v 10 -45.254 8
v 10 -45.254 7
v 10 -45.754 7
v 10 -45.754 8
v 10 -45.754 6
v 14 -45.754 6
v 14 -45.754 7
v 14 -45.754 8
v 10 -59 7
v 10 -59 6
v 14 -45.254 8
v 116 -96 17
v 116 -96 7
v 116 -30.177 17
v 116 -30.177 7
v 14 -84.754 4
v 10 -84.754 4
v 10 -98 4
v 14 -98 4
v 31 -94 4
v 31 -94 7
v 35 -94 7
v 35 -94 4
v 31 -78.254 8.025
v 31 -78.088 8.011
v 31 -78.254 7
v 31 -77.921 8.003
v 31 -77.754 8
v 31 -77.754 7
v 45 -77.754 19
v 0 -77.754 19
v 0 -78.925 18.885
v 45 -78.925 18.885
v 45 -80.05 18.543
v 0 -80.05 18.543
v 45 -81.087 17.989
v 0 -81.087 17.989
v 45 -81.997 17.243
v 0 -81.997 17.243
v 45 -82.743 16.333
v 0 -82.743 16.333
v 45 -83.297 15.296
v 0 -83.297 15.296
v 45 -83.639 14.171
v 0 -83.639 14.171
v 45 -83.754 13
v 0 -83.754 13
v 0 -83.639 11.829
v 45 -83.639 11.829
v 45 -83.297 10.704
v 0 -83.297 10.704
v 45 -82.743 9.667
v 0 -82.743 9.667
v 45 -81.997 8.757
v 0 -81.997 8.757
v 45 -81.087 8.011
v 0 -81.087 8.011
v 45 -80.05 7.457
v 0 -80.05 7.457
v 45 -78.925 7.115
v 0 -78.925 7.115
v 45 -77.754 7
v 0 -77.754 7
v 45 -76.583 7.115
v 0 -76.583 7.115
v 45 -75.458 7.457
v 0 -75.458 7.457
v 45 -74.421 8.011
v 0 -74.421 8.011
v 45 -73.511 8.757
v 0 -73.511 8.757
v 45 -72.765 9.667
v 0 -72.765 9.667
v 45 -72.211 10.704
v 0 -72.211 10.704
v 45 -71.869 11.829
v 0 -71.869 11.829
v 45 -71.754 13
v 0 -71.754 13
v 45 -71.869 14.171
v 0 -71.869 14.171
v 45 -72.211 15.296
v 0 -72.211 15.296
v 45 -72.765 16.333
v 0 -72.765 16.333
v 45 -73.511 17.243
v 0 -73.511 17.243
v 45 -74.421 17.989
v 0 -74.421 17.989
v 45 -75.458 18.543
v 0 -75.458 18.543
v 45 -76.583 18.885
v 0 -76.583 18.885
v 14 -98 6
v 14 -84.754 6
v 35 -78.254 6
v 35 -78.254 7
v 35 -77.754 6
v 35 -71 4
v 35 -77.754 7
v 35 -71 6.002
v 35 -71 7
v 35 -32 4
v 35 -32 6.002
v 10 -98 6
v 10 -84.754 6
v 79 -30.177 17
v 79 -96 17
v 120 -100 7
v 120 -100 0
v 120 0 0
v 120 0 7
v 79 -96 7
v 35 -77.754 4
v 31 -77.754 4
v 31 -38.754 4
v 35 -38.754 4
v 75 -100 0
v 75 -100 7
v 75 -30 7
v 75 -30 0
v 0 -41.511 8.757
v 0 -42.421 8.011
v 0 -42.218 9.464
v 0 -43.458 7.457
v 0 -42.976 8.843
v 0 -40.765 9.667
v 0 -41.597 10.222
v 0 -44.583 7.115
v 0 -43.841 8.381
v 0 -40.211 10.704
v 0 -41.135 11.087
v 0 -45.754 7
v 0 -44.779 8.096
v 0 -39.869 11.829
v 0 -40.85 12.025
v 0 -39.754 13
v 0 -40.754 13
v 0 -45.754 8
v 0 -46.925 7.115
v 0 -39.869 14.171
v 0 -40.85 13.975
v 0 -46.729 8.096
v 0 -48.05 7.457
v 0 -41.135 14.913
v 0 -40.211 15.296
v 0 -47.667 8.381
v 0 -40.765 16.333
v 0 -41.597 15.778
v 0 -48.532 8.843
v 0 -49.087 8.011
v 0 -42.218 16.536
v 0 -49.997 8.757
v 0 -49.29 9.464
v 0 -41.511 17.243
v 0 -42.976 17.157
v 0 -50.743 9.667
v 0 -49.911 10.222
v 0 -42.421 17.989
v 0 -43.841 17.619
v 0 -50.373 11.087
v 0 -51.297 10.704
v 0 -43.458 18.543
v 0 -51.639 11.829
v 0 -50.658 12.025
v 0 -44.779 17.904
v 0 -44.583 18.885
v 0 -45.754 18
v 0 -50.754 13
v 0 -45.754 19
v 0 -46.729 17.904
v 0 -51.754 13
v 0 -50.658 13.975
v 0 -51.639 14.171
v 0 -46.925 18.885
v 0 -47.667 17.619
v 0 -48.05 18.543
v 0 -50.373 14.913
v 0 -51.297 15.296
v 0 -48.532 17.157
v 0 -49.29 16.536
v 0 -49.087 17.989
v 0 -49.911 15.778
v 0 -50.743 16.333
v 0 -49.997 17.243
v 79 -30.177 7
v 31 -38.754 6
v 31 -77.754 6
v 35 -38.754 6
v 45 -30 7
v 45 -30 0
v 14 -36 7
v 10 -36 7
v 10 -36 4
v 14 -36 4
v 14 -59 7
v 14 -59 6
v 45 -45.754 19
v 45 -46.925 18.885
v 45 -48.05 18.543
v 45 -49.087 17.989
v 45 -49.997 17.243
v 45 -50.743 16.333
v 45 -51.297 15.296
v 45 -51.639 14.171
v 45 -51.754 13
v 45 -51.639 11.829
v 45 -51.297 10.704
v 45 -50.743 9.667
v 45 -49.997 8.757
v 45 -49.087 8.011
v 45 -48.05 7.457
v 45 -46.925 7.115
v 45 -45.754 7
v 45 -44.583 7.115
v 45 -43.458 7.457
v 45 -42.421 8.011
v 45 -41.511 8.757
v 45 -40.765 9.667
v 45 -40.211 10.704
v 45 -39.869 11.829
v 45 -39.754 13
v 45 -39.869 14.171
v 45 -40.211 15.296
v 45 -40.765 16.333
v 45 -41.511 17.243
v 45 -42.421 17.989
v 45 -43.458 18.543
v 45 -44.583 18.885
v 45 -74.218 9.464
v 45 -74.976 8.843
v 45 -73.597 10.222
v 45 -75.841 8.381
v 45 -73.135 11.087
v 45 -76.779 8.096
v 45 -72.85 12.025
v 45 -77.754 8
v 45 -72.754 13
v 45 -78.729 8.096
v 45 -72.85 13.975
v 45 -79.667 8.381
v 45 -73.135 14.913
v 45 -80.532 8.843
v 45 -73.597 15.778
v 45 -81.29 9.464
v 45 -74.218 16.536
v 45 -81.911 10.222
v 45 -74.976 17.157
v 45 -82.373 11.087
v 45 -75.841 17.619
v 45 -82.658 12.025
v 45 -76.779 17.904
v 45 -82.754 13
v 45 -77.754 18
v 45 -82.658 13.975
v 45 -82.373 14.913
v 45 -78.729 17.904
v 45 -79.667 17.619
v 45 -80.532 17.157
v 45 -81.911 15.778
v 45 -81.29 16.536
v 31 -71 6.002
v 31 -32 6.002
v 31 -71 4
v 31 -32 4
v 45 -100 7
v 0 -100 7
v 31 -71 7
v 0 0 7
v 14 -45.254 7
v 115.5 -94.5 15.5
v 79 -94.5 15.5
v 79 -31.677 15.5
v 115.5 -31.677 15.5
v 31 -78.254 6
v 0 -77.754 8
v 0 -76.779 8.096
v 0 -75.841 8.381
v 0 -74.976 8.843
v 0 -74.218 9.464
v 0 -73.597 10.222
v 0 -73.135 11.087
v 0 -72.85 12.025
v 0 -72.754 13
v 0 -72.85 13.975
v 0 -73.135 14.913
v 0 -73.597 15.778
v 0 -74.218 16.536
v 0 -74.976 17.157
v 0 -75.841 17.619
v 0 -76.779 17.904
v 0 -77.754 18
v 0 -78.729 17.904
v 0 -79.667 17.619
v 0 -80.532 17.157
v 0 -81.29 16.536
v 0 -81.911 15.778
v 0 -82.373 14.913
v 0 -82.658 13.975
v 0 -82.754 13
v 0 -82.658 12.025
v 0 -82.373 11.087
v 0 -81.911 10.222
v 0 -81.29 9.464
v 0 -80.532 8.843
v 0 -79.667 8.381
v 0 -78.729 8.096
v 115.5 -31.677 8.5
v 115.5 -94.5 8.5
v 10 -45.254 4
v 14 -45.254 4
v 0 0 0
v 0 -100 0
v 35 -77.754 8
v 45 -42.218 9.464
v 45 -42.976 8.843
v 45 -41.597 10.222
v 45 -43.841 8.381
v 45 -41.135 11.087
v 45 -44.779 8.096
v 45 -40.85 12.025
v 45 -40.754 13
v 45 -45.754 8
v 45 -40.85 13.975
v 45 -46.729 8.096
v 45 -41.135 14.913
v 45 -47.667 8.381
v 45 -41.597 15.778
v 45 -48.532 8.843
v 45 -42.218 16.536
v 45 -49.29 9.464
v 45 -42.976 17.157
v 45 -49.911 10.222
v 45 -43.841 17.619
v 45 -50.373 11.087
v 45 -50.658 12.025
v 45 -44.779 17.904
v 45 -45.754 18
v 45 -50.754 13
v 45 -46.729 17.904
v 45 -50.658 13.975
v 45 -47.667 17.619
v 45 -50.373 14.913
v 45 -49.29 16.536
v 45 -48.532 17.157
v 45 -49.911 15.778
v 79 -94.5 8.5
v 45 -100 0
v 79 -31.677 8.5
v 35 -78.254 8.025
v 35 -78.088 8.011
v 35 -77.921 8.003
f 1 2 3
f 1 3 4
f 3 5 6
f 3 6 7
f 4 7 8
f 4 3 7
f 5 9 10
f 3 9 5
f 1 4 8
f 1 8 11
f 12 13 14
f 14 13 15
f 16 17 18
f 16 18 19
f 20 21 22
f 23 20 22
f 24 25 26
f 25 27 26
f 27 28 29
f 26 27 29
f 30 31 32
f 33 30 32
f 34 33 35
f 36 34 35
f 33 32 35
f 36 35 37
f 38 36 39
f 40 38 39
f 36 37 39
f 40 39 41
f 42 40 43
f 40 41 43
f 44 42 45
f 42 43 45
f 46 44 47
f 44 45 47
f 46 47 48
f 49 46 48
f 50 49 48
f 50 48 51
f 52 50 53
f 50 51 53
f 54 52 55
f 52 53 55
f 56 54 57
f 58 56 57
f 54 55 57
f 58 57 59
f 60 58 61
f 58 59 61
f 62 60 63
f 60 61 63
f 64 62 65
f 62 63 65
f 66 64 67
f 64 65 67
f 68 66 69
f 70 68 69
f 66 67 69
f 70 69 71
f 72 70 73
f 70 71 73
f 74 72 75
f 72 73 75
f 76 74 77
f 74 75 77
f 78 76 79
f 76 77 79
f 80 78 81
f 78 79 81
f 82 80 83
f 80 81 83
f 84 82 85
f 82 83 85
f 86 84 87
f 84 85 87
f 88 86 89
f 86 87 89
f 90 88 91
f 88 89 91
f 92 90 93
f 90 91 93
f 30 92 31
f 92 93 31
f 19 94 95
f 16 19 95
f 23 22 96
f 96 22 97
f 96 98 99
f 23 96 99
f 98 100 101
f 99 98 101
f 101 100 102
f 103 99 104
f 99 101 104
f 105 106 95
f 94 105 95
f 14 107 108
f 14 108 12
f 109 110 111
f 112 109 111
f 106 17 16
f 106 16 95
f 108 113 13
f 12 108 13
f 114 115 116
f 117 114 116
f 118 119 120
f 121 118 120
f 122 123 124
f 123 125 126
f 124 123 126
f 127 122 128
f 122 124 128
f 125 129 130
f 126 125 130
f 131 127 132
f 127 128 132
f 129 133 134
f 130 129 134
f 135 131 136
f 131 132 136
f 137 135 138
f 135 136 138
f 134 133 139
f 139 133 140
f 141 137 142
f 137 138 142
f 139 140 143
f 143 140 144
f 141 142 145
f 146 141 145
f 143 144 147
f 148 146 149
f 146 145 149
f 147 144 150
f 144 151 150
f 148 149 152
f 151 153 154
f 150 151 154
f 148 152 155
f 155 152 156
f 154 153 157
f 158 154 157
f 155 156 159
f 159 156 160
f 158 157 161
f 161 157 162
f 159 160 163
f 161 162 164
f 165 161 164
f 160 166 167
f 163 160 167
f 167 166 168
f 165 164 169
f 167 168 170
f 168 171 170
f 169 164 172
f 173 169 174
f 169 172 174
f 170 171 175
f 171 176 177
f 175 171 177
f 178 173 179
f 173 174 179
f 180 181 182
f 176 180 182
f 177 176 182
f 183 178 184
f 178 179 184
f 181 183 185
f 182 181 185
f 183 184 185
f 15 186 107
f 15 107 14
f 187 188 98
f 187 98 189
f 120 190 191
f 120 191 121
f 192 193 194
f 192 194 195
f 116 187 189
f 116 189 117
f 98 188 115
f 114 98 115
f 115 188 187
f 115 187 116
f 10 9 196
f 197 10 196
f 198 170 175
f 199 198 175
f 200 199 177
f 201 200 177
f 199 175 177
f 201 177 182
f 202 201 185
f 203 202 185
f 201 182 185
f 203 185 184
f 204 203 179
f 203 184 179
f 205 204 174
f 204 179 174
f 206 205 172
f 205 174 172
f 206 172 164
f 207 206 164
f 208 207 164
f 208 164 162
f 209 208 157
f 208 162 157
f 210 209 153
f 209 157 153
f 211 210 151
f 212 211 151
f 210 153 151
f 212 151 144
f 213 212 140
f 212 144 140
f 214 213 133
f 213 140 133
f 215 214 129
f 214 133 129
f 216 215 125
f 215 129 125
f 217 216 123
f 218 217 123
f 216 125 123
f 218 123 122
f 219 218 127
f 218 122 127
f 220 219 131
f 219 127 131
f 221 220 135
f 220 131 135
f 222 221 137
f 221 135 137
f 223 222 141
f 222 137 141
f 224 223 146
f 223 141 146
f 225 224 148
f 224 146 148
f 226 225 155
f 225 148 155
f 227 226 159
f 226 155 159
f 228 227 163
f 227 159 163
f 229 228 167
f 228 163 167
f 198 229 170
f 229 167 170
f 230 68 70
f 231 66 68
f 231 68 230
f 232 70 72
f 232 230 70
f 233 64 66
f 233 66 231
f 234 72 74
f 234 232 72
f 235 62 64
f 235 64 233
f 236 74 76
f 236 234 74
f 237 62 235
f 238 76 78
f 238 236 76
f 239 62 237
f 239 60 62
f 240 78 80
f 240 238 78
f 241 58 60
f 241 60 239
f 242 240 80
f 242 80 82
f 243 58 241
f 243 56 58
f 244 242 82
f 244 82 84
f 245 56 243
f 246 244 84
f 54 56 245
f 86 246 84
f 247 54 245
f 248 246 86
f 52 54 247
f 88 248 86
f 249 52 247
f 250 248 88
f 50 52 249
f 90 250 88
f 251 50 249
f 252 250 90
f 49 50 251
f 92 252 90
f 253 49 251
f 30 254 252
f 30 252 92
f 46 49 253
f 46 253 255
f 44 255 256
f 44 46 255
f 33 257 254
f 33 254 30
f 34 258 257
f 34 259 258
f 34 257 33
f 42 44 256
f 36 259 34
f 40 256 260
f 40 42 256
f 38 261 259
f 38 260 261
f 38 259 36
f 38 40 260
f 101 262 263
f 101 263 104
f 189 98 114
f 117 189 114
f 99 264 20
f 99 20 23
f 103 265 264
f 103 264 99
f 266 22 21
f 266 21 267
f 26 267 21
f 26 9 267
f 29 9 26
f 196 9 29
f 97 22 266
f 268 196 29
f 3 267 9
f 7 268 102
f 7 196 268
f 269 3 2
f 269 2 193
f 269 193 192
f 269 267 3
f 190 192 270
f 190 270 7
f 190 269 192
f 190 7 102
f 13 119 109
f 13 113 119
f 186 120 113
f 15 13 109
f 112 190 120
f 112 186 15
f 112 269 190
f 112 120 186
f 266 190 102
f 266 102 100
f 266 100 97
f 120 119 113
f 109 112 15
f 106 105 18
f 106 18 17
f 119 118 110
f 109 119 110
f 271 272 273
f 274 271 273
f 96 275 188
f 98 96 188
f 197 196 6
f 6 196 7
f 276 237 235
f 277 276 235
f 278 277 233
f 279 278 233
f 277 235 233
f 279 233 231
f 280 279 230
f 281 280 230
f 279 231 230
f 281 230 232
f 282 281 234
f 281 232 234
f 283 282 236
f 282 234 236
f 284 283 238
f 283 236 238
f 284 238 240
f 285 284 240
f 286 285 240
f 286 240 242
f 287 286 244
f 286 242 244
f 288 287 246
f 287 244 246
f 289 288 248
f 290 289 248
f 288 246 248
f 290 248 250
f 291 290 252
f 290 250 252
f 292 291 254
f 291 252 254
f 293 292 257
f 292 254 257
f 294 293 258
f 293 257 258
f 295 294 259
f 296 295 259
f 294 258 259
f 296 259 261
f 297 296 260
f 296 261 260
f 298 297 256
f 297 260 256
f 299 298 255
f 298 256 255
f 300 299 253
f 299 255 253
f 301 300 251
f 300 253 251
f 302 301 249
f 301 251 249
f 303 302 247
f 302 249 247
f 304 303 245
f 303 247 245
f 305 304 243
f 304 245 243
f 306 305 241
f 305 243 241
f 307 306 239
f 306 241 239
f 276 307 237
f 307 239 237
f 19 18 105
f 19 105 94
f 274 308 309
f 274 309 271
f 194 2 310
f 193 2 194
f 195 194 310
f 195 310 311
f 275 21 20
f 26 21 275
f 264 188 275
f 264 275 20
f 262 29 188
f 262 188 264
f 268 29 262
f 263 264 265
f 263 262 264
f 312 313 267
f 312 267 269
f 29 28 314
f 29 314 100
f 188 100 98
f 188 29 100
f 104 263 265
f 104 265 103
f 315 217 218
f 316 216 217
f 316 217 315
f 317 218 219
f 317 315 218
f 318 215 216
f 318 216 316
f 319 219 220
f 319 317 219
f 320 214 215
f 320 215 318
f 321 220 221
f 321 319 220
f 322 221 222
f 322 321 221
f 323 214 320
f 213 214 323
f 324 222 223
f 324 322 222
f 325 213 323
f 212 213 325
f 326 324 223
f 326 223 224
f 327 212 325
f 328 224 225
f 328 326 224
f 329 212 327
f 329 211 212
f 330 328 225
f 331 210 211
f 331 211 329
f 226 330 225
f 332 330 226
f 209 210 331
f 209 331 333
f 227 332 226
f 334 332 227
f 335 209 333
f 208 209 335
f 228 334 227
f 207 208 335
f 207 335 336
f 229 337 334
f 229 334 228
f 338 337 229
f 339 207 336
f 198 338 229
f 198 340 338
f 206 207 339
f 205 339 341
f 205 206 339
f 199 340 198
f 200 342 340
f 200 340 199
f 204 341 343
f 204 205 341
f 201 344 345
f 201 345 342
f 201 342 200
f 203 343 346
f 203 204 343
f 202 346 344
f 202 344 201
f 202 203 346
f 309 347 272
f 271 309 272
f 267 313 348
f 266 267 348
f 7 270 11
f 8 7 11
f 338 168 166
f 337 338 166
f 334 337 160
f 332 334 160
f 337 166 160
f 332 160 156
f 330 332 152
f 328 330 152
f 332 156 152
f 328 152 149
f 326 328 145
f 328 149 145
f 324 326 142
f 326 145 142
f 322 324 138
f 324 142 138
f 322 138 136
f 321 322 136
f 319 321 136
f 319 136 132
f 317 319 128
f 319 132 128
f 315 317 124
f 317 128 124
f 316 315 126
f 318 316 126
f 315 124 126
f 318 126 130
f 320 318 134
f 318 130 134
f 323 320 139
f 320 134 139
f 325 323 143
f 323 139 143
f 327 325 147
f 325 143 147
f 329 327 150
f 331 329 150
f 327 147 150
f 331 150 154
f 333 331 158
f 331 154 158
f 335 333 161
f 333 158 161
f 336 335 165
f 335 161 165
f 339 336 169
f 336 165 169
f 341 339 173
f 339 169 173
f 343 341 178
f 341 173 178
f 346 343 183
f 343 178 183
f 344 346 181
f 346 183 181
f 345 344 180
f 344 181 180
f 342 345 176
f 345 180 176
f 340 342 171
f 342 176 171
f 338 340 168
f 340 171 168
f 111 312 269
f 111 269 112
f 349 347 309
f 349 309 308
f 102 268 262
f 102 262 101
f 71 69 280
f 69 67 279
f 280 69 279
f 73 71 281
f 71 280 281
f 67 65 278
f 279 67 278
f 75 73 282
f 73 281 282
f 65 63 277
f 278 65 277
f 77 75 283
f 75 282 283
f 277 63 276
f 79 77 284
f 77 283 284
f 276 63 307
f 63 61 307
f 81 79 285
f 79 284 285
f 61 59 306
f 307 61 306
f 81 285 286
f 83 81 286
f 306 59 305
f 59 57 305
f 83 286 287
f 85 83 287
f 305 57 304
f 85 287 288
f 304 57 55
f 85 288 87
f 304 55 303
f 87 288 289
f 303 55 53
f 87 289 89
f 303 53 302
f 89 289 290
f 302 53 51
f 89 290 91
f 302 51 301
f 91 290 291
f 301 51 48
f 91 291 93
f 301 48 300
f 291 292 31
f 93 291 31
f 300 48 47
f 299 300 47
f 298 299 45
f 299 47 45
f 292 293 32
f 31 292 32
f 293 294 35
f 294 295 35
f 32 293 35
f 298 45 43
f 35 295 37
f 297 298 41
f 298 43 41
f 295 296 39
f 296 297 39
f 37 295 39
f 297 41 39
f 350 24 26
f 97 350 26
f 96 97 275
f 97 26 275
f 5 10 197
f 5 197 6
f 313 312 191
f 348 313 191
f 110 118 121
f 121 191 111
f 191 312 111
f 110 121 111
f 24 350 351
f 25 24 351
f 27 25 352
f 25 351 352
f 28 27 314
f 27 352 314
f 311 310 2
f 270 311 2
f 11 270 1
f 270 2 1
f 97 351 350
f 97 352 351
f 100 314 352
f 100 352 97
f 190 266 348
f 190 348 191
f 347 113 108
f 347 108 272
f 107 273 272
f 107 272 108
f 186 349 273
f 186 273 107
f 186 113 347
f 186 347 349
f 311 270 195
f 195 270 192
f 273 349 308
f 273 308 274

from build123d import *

# Parameters (mm, degrees)
SKETCH2_W            = 120
SKETCH2_H            = 100
BOSS_EXTRUDE1_DEPTH  = 7
SKETCH4_W            = 30
SKETCH4_H            = 70
CUT_EXTRUDE1_DEPTH   = 10
SKETCH5_R            = 6
BOSS_EXTRUDE2_DEPTH  = 45
SKETCH8_R            = 5
CUT_EXTRUDE2_DEPTH   = 45
SKETCH10_W           = 4
SKETCH10_H           = 23
CUT_EXTRUDE4_DEPTH   = 3
SKETCH12_W           = 4
SKETCH12_H           = 2
CUT_EXTRUDE5_DEPTH   = 39
SKETCH13_W           = 4
SKETCH13_H           = 2.002152941
CUT_EXTRUDE6_DEPTH   = 39
SKETCH15_W           = 4
SKETCH15_H           = 0.5
BOSS_EXTRUDE4_DEPTH  = 4
SKETCH17_W           = 2
SKETCH17_H           = 39
BOSS_EXTRUDE7_DEPTH  = 4
SKETCH21_W           = 4
SKETCH21_H           = 0.5
BOSS_EXTRUDE8_DEPTH  = 4
SKETCH23_W           = 2
SKETCH23_H           = 39
BOSS_EXTRUDE11_DEPTH = 4
SKETCH24_R           = 6
BOSS_EXTRUDE13_DEPTH = 45
SKETCH25_R           = 5
CUT_EXTRUDE7_DEPTH   = 45
SKETCH28_W           = 37
SKETCH28_H           = 65.823303479
BOSS_EXTRUDE15_DEPTH = 10
SKETCH30_W           = 7
SKETCH30_H           = 62.823303479
CUT_EXTRUDE8_DEPTH   = 36.5


with BuildPart() as part:
    # Sketch2 → Boss-Extrude1 (new body)
    with BuildSketch(Plane.XY):
        with Locations((60, -50)):
            Rectangle(SKETCH2_W, SKETCH2_H)
    extrude(amount=BOSS_EXTRUDE1_DEPTH)

    # Sketch4 → Cut-Extrude1 (cut)
    with BuildSketch(Plane.XY.offset(7)):
        with Locations((60, -65)):
            Rectangle(SKETCH4_W, SKETCH4_H)
    extrude(amount=-CUT_EXTRUDE1_DEPTH, mode=Mode.SUBTRACT)

    # Sketch10 → Cut-Extrude4 (cut)
    with BuildSketch(Plane.XY.offset(7)):
        with Locations((12, -47.5)):
            Rectangle(SKETCH10_W, SKETCH10_H)
        with Locations((32.99968141, -82.5)):
            Rectangle(SKETCH10_W, SKETCH10_H)
    extrude(amount=-CUT_EXTRUDE4_DEPTH, mode=Mode.SUBTRACT)

    # Sketch12 → Cut-Extrude5 (cut)
    with BuildSketch(Plane(origin=(0, -59, 0), x_dir=(1, 0, 0), z_dir=(0, 1, 0))):
        with Locations((12, -5)):
            Rectangle(SKETCH12_W, SKETCH12_H)
    extrude(amount=-CUT_EXTRUDE5_DEPTH, mode=Mode.SUBTRACT)

    # Sketch13 → Cut-Extrude6 (cut)
    with BuildSketch(Plane.XZ.offset(71)):
        with Locations((32.99968141, 5.001076471)):
            Rectangle(SKETCH13_W, SKETCH13_H)
    extrude(amount=-CUT_EXTRUDE6_DEPTH, mode=Mode.SUBTRACT)



with BuildPart() as body_2:
    # Sketch5 → Boss-Extrude2 (new body)
    with BuildSketch(Plane(origin=(0, 0, 0), x_dir=(0, 0, -1), z_dir=(1, 0, 0))):
        with Locations((-13, -45.753984495)):
            Circle(SKETCH5_R)
    extrude(amount=BOSS_EXTRUDE2_DEPTH)

    # Sketch8 → Cut-Extrude2 (cut)
    with BuildSketch(Plane.ZY):
        with Locations((13, -45.753984495)):
            Circle(SKETCH8_R)
    extrude(amount=-CUT_EXTRUDE2_DEPTH, mode=Mode.SUBTRACT)


with BuildPart() as body_3:
    # Sketch15 → Boss-Extrude4 (new body)
    with BuildSketch(Plane.ZY.offset(-10)):
        with Locations((6, -45.503984495)):
            Rectangle(SKETCH15_W, SKETCH15_H)
    extrude(amount=-BOSS_EXTRUDE4_DEPTH)


with BuildPart() as part_1:
    add(part.part)

    add(body_3.part)  # Boss-Extrude7 merges body 3
    # Sketch17 → Boss-Extrude7 (add)
    with BuildSketch(Plane.ZY.offset(-10)):
        with Locations((5, -65.253984495)):
            Rectangle(SKETCH17_W, SKETCH17_H)
    extrude(amount=-BOSS_EXTRUDE7_DEPTH)

    # Sketch21 → Boss-Extrude8 (add)
    with BuildSketch(Plane(origin=(30.99968141, 0, 0), x_dir=(0, 0, -1), z_dir=(1, 0, 0))):
        with Locations((-8, -78.003984495)):
            Rectangle(SKETCH21_W, SKETCH21_H)
    extrude(amount=BOSS_EXTRUDE8_DEPTH)


with BuildPart() as body_3_2:
    # Sketch23 → Boss-Extrude11 (new body)
    with BuildSketch(Plane(origin=(30.99968141, 0, 0), x_dir=(0, 0, -1), z_dir=(1, 0, 0))):
        with Locations((-5, -58.253984495)):
            Rectangle(SKETCH23_W, SKETCH23_H)
    extrude(amount=BOSS_EXTRUDE11_DEPTH)


with BuildPart() as body_4:
    # Sketch24 → Boss-Extrude13 (new body)
    with BuildSketch(Plane(origin=(0, 0, 0), x_dir=(0, 0, -1), z_dir=(1, 0, 0))):
        with Locations((-13, -77.753984495)):
            Circle(SKETCH24_R)
    extrude(amount=BOSS_EXTRUDE13_DEPTH)


with BuildPart() as cut_extrude7_tool:
    # Sketch25 → Cut-Extrude7 (new body)
    with BuildSketch(Plane(origin=(45, 0, 0), x_dir=(0, 0, -1), z_dir=(1, 0, 0))):
        with Locations((-13, -77.753984495)):
            Circle(SKETCH25_R)
    extrude(amount=-CUT_EXTRUDE7_DEPTH)


with BuildPart() as part_2:
    add(part_1.part)

    # Cut-Extrude7: cut by cut_extrude7_tool
    add(cut_extrude7_tool.part, mode=Mode.SUBTRACT)

    # Sketch28 → Boss-Extrude15 (add)
    with BuildSketch(Plane.XY.offset(7)):
        with Locations((97.5, -63.08834826)):
            Rectangle(SKETCH28_W, SKETCH28_H)
    extrude(amount=BOSS_EXTRUDE15_DEPTH)

    # Sketch30 → Cut-Extrude8 (cut)
    with BuildSketch(Plane.ZY.offset(-79)):
        with Locations((12, -63.08834826)):
            Rectangle(SKETCH30_W, SKETCH30_H)
    extrude(amount=-CUT_EXTRUDE8_DEPTH, mode=Mode.SUBTRACT)


with BuildPart() as body_4_1:
    add(body_4.part)

    # Cut-Extrude7: cut by cut_extrude7_tool
    add(cut_extrude7_tool.part, mode=Mode.SUBTRACT)


solid = Compound([body_2.part, body_3_2.part, part_2.part, body_4_1.part])
